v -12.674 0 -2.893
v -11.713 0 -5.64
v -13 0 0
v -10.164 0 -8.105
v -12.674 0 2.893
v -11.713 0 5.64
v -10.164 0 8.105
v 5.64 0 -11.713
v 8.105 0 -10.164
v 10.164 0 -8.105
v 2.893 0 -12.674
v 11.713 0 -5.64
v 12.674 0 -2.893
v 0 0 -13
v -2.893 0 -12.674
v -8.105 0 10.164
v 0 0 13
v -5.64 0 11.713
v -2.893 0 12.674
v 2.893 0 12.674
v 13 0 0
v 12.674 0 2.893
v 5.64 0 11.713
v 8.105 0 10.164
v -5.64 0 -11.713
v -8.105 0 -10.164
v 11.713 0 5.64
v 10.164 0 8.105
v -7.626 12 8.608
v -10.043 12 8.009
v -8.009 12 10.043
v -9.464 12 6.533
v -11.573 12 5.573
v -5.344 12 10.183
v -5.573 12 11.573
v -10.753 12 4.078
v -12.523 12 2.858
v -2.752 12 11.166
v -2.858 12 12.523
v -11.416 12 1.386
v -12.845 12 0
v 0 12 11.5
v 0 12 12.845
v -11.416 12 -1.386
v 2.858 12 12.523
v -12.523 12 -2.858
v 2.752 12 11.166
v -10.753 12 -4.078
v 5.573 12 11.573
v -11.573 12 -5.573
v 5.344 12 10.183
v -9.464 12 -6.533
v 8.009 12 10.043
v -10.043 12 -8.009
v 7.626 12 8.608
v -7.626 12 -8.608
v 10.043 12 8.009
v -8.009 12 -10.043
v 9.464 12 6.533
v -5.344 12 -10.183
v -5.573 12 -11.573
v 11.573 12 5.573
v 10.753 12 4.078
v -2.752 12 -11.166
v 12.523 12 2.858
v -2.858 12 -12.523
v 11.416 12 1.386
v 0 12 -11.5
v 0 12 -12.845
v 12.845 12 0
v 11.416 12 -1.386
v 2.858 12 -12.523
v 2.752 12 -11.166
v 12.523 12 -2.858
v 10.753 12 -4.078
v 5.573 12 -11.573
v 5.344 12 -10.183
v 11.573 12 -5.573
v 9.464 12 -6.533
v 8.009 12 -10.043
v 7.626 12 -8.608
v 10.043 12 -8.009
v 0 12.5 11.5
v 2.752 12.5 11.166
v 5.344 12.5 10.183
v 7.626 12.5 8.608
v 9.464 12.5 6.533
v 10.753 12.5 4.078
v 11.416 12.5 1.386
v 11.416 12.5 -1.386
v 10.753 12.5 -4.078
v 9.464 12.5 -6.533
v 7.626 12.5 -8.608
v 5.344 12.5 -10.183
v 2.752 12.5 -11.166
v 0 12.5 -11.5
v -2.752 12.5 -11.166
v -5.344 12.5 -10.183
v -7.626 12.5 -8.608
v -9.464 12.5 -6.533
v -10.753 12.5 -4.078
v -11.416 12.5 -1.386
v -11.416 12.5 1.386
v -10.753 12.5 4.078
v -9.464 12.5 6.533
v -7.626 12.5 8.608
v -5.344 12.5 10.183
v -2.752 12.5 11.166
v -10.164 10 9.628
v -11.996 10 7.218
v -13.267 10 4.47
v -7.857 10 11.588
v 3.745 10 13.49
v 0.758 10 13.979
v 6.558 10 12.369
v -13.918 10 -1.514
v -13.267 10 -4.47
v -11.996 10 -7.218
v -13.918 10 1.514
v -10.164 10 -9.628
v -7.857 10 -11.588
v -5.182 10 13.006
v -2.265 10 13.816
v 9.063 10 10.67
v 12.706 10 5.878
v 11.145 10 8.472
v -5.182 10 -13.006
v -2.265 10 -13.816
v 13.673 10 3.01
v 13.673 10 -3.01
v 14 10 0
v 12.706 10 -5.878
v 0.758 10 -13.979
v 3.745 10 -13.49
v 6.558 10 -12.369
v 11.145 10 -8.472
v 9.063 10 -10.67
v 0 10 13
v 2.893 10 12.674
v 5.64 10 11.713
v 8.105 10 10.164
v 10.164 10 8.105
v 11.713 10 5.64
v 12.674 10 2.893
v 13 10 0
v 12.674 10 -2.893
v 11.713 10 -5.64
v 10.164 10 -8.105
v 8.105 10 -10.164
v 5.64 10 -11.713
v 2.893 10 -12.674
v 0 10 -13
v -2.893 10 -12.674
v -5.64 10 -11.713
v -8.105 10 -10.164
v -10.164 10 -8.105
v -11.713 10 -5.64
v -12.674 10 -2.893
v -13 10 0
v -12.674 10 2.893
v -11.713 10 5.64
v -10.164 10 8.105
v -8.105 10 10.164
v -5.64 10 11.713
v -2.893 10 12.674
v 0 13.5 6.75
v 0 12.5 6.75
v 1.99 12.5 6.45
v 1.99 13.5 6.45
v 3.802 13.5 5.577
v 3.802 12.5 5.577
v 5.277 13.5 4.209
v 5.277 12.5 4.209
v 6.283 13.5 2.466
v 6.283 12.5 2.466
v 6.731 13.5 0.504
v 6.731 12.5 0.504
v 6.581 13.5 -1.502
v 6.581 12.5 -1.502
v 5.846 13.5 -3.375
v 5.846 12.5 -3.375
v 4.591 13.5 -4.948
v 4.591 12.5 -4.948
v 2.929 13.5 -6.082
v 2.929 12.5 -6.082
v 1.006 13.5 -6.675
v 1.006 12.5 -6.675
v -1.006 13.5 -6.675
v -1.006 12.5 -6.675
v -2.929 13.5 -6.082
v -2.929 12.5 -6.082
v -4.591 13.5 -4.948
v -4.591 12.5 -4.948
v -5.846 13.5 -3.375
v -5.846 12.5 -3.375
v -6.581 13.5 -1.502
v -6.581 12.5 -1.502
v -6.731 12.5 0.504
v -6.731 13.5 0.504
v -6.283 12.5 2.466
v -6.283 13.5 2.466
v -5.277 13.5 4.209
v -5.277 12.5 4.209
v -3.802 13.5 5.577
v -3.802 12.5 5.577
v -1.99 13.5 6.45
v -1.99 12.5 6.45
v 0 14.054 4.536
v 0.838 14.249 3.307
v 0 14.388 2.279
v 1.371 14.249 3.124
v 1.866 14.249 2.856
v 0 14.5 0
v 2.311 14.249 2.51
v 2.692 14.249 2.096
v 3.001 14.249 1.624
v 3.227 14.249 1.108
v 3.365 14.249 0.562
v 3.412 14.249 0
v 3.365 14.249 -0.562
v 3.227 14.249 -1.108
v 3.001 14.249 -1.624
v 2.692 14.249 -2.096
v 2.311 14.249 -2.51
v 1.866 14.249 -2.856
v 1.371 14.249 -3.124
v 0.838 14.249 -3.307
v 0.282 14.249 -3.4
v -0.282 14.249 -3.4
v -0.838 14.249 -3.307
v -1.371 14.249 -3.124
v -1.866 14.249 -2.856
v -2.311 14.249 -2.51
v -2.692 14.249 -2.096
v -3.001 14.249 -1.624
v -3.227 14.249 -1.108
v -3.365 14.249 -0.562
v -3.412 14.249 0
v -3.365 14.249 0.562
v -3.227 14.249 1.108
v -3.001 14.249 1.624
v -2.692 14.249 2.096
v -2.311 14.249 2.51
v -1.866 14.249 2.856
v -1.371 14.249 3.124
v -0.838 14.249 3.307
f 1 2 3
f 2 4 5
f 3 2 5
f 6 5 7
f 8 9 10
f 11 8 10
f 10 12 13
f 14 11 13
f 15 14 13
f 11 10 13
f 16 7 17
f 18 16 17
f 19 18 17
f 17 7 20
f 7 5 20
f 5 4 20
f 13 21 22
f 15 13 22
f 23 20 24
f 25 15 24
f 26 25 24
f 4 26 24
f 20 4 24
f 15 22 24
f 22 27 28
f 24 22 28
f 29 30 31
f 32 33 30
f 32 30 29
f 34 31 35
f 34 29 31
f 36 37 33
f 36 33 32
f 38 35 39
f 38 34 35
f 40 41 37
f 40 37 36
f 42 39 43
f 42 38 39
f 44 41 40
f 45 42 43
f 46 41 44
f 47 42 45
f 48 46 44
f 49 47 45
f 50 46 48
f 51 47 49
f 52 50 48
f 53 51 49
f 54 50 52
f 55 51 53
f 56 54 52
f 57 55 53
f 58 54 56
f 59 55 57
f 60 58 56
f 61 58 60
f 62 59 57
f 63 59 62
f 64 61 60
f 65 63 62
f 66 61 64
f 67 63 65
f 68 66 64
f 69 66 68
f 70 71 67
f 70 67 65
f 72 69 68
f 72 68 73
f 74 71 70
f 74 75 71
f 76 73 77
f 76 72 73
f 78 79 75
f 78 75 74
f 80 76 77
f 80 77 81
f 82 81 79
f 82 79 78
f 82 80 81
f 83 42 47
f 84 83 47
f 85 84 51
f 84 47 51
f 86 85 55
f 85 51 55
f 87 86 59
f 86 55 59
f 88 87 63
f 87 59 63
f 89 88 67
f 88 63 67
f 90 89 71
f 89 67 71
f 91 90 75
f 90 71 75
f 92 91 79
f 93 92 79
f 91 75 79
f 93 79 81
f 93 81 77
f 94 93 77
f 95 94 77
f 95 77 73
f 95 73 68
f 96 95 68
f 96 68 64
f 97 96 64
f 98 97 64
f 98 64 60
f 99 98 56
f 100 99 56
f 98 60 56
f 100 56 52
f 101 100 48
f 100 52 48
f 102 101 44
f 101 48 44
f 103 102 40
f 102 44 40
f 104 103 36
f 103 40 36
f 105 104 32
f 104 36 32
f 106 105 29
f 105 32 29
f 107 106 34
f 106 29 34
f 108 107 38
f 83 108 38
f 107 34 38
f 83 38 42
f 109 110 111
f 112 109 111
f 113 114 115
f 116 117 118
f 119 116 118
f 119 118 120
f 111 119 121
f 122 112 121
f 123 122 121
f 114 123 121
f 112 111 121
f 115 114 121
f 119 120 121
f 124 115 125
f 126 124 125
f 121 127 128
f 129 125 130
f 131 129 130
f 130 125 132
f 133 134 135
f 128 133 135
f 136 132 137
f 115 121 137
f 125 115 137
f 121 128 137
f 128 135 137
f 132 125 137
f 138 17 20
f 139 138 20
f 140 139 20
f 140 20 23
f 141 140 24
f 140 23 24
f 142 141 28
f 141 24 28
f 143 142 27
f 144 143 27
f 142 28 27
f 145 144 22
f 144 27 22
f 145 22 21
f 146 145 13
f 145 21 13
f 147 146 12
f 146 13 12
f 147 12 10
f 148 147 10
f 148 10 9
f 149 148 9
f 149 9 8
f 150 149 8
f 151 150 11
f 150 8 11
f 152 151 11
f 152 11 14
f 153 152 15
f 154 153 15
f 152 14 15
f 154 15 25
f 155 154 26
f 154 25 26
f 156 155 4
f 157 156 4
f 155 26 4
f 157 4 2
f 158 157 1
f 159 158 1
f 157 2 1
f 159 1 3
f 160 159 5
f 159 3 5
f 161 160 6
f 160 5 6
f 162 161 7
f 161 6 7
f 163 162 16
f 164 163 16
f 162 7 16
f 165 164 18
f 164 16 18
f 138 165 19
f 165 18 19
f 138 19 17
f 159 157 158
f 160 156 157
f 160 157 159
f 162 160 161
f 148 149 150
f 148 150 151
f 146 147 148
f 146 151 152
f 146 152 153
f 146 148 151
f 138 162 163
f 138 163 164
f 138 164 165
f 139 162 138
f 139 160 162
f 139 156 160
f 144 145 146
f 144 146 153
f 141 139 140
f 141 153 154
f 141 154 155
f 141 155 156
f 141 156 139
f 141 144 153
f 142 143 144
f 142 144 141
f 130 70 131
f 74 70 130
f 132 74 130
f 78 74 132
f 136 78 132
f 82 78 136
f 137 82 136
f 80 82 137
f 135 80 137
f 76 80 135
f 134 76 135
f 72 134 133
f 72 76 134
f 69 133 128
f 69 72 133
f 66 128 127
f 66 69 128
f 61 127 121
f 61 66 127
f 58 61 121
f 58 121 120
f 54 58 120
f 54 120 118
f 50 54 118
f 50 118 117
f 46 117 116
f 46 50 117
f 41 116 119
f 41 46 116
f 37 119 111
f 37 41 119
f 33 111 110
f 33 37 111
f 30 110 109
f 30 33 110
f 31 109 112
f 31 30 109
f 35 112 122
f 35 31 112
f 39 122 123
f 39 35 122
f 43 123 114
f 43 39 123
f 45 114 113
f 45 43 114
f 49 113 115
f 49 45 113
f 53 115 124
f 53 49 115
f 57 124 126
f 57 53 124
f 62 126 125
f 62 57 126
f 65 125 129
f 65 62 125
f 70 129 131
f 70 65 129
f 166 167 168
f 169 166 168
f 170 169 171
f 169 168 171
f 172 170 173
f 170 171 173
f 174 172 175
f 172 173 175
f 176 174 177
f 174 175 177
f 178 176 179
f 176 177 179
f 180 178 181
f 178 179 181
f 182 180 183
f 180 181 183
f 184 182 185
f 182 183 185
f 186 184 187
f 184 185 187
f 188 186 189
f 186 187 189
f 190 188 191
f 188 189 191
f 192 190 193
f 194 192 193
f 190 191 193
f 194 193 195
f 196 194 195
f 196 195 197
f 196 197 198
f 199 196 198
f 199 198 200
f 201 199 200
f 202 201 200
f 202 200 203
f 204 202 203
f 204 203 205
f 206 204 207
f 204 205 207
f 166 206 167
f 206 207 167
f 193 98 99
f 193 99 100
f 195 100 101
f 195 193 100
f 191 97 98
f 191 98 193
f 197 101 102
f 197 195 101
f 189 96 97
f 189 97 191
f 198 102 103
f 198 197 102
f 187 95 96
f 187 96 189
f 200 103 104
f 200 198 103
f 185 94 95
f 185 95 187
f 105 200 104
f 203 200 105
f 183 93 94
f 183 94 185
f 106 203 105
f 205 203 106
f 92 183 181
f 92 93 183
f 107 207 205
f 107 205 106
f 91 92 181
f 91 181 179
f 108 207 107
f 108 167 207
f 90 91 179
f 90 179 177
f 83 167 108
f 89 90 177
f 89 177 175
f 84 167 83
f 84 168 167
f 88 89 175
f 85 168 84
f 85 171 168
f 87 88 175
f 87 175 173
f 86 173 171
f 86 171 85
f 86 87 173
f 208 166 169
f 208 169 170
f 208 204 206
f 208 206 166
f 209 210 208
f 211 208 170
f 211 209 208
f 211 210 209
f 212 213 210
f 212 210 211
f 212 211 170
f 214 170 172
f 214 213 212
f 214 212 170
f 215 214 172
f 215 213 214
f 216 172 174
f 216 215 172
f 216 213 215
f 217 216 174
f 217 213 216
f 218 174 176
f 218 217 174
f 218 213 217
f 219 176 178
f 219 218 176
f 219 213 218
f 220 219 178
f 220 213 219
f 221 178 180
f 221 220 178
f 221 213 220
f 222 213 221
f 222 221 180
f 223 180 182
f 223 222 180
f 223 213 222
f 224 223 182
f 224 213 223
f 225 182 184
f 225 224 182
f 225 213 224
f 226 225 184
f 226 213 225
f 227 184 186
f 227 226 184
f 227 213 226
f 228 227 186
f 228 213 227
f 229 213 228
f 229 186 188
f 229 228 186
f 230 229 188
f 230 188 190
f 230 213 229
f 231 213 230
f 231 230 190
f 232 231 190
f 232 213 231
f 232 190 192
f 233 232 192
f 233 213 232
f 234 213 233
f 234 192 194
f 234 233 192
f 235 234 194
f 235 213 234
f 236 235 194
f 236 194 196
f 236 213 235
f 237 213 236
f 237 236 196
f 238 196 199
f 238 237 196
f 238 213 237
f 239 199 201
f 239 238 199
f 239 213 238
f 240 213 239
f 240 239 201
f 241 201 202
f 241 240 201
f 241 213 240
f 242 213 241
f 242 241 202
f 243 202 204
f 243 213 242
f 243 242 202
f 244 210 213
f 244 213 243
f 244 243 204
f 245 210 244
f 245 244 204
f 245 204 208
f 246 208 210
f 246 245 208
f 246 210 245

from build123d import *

# Parameters (mm, degrees)
SKETCH1_R           = 13
BOSS_EXTRUDE1_DEPTH = 10
SKETCH2_R           = 14
BOSS_EXTRUDE2_DEPTH = 2
BOSS_EXTRUDE2_TAPER = 30
SKETCH3_R           = 11.5
BOSS_EXTRUDE3_DEPTH = 0.5
SKETCH4_R           = 6.75
BOSS_EXTRUDE4_DEPTH = 1
DOME1_FACE_RADIUS   = 6.75
DOME1_HEIGHT        = 1


with BuildPart() as part:
    # Sketch1 → Boss-Extrude1 (new body)
    with BuildSketch(Plane(origin=(0, 0, 0), x_dir=(1, 0, 0), z_dir=(0, 1, 0))):
        with Locations(Location((0, 0, 0), (0, 0, 270))):
            Circle(SKETCH1_R)
    extrude(amount=BOSS_EXTRUDE1_DEPTH)


with BuildPart() as body_2:
    # Sketch2 → Boss-Extrude2 (new body)
    with BuildSketch(Plane(origin=(0, 10, 0), x_dir=(1, 0, 0), z_dir=(0, 1, 0))):
        Circle(SKETCH2_R)
    extrude(amount=BOSS_EXTRUDE2_DEPTH, taper=BOSS_EXTRUDE2_TAPER)

    # Sketch3 → Boss-Extrude3 (add)
    with BuildSketch(Plane(origin=(0, 12, 0), x_dir=(1, 0, 0), z_dir=(0, 1, 0))):
        with Locations(Location((0, 0, 0), (0, 0, 270))):
            Circle(SKETCH3_R)
    extrude(amount=BOSS_EXTRUDE3_DEPTH)

    # Sketch4 → Boss-Extrude4 (add)
    with BuildSketch(Plane(origin=(0, 12.5, 0), x_dir=(1, 0, 0), z_dir=(0, 1, 0))):
        with Locations(Location((0, 0, 0), (0, 0, 270))):
            Circle(SKETCH4_R)
    extrude(amount=BOSS_EXTRUDE4_DEPTH)

    # Dome1: a dome of height H over a round flat face of radius A is a cap of a sphere of radius (A * A + H * H) / (2 * H)
    dome1_r = (DOME1_FACE_RADIUS * DOME1_FACE_RADIUS + DOME1_HEIGHT * DOME1_HEIGHT) / (2 * DOME1_HEIGHT)
    dome1_base = Plane((0, 13.5, 0), z_dir=(0, 1, 0))
    with Locations(dome1_base.offset(DOME1_HEIGHT - dome1_r)):
        dome1_ball = Sphere(dome1_r, mode=Mode.PRIVATE)
    add(split(dome1_ball, bisect_by=dome1_base, keep=Keep.TOP, mode=Mode.PRIVATE))


solid = Compound([part.part, body_2.part])
